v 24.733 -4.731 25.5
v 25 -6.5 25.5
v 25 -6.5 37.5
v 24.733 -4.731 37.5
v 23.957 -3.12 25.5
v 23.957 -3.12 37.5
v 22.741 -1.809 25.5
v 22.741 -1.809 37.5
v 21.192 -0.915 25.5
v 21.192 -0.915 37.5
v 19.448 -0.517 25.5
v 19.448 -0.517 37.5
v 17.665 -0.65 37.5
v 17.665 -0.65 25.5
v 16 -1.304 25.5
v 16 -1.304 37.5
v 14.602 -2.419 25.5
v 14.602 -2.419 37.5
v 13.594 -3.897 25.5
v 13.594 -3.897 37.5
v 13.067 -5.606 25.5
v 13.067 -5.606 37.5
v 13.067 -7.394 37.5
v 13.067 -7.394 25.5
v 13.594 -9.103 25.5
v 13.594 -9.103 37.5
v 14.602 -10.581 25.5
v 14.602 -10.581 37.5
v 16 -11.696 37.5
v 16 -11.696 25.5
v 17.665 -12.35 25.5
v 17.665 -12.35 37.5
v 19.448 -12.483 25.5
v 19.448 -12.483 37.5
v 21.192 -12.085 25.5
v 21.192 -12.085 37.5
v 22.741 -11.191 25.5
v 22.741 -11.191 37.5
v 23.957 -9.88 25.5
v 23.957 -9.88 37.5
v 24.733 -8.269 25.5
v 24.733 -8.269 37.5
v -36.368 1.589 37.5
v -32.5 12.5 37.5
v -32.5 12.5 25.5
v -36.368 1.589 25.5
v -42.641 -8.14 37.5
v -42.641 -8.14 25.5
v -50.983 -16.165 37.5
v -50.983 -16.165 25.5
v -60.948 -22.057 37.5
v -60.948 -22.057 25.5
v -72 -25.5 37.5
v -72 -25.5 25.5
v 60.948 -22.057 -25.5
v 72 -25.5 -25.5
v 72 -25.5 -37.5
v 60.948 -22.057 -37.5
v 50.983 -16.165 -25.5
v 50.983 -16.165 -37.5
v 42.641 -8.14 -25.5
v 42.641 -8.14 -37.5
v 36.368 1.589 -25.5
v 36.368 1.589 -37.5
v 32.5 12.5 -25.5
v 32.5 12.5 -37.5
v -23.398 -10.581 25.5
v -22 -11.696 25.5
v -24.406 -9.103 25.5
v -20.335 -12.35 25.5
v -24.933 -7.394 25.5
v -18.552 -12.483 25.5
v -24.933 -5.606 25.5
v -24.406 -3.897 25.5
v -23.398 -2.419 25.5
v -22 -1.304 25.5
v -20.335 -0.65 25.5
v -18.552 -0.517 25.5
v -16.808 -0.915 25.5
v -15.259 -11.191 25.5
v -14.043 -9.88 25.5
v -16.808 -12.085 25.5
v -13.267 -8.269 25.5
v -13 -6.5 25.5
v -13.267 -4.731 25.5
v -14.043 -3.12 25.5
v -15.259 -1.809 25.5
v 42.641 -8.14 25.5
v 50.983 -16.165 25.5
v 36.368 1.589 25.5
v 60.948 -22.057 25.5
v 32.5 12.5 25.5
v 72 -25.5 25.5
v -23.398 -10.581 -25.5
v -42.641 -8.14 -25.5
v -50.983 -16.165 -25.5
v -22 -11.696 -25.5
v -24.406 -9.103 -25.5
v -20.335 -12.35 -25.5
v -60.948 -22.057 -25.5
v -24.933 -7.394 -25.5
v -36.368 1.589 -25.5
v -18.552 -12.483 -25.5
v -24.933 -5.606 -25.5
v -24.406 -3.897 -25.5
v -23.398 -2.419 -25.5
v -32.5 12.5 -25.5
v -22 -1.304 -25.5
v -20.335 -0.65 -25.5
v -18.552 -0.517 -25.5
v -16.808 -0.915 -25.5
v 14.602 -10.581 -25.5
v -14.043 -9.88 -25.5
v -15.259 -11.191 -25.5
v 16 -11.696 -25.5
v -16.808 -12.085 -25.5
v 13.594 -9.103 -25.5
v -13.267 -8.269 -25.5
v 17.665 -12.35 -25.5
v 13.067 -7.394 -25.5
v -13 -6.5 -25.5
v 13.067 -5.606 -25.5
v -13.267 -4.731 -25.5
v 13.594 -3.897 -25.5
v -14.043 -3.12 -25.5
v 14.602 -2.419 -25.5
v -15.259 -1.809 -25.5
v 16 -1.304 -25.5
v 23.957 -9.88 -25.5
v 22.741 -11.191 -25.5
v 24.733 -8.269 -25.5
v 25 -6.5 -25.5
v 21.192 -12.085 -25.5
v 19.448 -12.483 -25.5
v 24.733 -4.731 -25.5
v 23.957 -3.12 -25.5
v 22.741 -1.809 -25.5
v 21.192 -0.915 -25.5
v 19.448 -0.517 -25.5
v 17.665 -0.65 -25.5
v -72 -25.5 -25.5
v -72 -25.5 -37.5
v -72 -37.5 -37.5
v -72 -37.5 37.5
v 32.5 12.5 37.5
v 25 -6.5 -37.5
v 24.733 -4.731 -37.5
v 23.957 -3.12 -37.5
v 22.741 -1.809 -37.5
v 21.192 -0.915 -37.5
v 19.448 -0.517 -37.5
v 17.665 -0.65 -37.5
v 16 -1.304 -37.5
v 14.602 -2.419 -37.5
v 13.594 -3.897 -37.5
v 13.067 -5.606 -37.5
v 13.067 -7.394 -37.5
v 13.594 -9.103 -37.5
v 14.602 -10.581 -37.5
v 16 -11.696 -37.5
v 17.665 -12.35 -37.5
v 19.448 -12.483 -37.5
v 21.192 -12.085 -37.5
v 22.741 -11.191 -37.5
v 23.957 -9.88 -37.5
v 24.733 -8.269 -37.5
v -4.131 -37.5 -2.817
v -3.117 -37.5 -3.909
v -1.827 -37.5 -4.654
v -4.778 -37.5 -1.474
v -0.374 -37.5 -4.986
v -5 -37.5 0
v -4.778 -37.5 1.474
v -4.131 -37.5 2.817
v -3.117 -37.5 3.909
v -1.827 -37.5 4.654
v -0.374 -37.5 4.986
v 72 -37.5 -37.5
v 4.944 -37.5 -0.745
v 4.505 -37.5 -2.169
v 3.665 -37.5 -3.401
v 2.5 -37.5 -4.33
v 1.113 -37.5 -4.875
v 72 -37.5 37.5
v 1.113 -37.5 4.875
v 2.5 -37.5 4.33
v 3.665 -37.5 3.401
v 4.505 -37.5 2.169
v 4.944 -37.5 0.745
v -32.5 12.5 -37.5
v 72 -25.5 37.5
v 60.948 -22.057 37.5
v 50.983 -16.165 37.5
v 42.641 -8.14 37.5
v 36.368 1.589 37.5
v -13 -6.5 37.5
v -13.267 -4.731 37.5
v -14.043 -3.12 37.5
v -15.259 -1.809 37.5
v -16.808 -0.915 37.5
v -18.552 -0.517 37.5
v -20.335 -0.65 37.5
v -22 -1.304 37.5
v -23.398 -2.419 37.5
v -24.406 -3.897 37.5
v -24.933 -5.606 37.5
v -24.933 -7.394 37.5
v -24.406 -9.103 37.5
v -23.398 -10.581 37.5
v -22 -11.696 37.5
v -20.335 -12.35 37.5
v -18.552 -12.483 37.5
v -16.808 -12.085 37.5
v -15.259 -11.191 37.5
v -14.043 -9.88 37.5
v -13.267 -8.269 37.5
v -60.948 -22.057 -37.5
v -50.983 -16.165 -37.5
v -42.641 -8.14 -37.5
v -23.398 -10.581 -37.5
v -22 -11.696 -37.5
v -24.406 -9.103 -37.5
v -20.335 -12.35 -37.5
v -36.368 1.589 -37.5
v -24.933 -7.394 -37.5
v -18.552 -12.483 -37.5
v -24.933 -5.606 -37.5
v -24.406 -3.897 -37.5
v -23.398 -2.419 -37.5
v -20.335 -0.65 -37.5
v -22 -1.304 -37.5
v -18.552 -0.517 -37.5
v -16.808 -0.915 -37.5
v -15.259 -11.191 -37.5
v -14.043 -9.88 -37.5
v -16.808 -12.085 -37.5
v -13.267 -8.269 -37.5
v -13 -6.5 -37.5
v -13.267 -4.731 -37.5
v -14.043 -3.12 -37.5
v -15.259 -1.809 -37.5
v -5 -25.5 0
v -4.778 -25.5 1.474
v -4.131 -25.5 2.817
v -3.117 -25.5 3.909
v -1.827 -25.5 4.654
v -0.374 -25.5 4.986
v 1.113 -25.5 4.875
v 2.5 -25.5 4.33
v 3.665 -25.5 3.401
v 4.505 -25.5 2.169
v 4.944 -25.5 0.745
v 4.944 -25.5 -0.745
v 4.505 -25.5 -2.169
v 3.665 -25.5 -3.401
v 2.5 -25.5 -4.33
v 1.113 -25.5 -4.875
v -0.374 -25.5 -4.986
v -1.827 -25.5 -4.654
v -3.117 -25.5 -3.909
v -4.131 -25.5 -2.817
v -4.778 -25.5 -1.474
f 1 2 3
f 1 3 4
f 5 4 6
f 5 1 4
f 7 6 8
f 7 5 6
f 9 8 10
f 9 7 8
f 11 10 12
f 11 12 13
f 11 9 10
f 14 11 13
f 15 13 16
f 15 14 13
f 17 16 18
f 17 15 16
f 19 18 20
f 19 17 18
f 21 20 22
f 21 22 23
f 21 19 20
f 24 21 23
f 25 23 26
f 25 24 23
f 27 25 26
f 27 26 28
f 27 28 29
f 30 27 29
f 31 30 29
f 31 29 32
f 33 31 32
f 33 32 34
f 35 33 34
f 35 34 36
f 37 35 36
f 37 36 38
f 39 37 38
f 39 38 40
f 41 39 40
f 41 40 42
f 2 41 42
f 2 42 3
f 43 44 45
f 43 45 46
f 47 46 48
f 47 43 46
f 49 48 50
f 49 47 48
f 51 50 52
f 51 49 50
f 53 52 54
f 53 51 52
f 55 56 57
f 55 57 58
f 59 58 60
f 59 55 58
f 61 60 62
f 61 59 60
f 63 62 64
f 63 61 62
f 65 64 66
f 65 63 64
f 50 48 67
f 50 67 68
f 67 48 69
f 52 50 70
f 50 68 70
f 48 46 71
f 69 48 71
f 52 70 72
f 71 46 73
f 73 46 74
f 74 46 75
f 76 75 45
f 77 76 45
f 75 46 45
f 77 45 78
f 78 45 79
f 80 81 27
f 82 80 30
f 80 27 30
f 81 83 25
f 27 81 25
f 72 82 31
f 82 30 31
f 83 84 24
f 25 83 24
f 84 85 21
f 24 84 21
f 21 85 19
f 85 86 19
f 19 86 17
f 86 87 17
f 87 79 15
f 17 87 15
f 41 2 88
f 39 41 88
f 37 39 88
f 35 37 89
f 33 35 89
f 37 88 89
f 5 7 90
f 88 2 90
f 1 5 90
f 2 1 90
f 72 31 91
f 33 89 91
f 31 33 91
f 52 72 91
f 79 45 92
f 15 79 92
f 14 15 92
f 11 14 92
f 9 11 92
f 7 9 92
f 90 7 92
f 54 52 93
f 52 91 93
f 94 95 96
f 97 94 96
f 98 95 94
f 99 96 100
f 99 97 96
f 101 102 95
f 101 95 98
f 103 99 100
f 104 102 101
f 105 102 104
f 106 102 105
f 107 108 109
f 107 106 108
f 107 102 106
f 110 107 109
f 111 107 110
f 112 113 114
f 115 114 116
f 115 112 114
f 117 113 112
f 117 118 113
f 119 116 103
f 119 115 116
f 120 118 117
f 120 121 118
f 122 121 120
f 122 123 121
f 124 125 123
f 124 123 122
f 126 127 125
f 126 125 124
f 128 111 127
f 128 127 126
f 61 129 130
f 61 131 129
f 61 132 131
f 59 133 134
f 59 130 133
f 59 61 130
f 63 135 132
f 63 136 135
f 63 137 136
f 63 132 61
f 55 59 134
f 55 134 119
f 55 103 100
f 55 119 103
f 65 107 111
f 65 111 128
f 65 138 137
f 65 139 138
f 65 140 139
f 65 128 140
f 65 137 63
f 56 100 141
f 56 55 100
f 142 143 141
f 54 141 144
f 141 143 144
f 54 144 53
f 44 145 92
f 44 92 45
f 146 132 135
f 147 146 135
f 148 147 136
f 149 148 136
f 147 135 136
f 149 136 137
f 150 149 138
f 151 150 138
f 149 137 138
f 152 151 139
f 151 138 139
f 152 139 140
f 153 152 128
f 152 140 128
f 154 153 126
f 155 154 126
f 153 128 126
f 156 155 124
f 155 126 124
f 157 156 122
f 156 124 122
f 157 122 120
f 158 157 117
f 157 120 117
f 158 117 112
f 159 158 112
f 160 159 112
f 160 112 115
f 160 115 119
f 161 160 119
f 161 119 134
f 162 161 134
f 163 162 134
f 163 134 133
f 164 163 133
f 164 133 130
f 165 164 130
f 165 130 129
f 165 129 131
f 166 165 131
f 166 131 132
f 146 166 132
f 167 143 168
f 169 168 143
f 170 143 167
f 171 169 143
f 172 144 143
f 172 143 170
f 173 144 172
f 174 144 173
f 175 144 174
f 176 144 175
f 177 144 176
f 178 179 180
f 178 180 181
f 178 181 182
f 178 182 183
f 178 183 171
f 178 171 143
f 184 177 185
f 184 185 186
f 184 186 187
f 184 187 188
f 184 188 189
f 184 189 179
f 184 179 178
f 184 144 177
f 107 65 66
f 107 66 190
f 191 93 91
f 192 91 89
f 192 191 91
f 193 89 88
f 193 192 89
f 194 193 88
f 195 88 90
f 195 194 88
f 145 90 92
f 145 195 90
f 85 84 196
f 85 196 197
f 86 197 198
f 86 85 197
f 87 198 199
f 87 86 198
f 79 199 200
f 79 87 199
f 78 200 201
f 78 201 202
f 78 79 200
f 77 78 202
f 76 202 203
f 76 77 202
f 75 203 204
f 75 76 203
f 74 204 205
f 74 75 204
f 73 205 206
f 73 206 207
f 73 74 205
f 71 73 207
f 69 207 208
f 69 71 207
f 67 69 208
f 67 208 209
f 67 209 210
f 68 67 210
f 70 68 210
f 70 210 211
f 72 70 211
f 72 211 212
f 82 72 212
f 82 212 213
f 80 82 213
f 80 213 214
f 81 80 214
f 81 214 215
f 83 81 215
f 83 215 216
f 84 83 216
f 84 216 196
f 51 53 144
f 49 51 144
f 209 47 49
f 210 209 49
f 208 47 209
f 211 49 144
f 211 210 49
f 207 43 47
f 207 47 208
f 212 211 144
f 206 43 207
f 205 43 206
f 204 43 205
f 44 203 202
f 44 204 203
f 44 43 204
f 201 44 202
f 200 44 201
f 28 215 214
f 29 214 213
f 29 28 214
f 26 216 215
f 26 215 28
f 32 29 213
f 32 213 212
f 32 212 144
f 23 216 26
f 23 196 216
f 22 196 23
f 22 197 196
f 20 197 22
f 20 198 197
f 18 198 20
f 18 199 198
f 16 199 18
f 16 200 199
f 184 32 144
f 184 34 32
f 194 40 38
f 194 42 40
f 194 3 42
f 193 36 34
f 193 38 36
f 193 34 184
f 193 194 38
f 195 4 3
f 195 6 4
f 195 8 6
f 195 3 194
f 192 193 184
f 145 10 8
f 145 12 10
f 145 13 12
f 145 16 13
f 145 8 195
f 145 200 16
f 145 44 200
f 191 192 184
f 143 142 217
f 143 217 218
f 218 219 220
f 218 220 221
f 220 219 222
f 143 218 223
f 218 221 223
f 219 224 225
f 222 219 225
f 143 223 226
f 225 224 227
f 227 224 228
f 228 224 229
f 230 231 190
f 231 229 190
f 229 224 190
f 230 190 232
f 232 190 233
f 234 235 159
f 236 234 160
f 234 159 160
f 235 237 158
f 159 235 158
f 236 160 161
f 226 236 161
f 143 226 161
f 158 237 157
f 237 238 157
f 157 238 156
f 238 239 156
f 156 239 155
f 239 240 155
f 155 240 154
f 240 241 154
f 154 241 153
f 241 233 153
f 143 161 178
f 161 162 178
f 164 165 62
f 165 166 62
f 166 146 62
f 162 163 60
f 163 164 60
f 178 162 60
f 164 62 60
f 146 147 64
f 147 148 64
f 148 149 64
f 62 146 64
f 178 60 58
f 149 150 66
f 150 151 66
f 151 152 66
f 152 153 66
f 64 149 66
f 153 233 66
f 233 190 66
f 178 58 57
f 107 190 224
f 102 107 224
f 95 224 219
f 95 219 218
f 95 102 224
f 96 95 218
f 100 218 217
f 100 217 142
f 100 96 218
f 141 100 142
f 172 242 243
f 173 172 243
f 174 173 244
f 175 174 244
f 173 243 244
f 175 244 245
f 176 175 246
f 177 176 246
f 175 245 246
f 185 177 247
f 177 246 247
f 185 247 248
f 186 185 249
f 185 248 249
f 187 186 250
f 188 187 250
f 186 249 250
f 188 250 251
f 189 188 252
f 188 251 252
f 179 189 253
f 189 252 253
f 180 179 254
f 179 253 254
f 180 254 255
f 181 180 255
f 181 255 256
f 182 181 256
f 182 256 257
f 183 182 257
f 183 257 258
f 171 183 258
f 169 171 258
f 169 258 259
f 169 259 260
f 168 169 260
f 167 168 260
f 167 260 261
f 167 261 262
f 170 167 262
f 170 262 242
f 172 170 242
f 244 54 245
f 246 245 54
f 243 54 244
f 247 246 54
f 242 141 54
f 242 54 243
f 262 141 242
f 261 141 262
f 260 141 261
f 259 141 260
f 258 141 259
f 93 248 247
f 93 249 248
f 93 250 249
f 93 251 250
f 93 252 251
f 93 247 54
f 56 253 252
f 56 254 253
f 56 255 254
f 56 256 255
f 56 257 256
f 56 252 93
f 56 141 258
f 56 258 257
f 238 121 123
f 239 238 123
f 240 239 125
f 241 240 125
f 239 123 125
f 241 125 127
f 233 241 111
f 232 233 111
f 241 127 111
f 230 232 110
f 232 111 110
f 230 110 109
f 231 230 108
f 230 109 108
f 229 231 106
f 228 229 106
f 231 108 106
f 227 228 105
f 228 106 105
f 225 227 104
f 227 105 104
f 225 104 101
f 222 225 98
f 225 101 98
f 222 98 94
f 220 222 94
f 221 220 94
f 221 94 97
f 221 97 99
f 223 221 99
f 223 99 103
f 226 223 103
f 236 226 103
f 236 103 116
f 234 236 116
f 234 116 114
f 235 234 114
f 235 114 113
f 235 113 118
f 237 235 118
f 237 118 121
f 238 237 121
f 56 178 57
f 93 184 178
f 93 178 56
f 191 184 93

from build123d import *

# Parameters (mm, degrees)
SKETCH1_R           = 6
SKETCH1_W           = 72
SKETCH1_H           = 12
BOSS_EXTRUDE1_DEPTH = 37.5
SKETCH2_W           = 164.389356844
SKETCH2_H           = 51
CUT_EXTRUDE1_DEPTH  = 38
SKETCH3_R           = 5
CUT_EXTRUDE2_DEPTH  = 90.633977932


with BuildPart() as part:
    # Sketch1 → Boss-Extrude1 (new, symmetric)
    # profile 1 of 4: a face of its own
    with BuildSketch(Plane.XY):
        with BuildLine():
            ThreePointArc((-32.5, 12.5), (-46.579087682, -12.39476412), (-72, -25.5))
            Line((-72, -25.5), (0, -25.5))
            Line((0, -25.5), (0, 12.5))
            Line((0, 12.5), (-32.5, 12.5))
        make_face()
        with Locations((-19, -6.5)):
            Circle(SKETCH1_R, mode=Mode.SUBTRACT)
    # profile 2 of 4: a face of its own
    with BuildSketch(Plane.XY):
        with BuildLine():
            Line((0, 12.5), (0, -25.5))
            Line((0, -25.5), (72, -25.5))
            ThreePointArc((72, -25.5), (46.579087682, -12.39476412), (32.5, 12.5))
            Line((32.5, 12.5), (0, 12.5))
        make_face()
        with Locations((19, -6.5)):
            Circle(SKETCH1_R, mode=Mode.SUBTRACT)
    # profile 3 of 4: a face of its own
    with BuildSketch(Plane.XY):
        with Locations((-36, -31.5)):
            Rectangle(SKETCH1_W, SKETCH1_H)
    # profile 4 of 4: a face of its own
    with BuildSketch(Plane.XY):
        with Locations((36, -31.5)):
            Rectangle(SKETCH1_W, SKETCH1_H)
    extrude(amount=BOSS_EXTRUDE1_DEPTH, both=True)

    # Sketch2 → Cut-Extrude1 (cut)
    with BuildSketch(Plane(origin=(0, 12.5, 0), x_dir=(1, 0, 0), z_dir=(0, 1, 0))):
        Rectangle(SKETCH2_W, SKETCH2_H)
    extrude(amount=-CUT_EXTRUDE1_DEPTH, mode=Mode.SUBTRACT)

    # Sketch3 → Cut-Extrude2 (cut, through all)
    with BuildSketch(Plane(origin=(0, -25.5, 0), x_dir=(1, 0, 0), z_dir=(0, 1, 0))):
        with Locations(Location((0, 0, 0), (0, 0, 180))):
            Circle(SKETCH3_R)
    extrude(amount=-CUT_EXTRUDE2_DEPTH, mode=Mode.SUBTRACT)


solid = part.part
